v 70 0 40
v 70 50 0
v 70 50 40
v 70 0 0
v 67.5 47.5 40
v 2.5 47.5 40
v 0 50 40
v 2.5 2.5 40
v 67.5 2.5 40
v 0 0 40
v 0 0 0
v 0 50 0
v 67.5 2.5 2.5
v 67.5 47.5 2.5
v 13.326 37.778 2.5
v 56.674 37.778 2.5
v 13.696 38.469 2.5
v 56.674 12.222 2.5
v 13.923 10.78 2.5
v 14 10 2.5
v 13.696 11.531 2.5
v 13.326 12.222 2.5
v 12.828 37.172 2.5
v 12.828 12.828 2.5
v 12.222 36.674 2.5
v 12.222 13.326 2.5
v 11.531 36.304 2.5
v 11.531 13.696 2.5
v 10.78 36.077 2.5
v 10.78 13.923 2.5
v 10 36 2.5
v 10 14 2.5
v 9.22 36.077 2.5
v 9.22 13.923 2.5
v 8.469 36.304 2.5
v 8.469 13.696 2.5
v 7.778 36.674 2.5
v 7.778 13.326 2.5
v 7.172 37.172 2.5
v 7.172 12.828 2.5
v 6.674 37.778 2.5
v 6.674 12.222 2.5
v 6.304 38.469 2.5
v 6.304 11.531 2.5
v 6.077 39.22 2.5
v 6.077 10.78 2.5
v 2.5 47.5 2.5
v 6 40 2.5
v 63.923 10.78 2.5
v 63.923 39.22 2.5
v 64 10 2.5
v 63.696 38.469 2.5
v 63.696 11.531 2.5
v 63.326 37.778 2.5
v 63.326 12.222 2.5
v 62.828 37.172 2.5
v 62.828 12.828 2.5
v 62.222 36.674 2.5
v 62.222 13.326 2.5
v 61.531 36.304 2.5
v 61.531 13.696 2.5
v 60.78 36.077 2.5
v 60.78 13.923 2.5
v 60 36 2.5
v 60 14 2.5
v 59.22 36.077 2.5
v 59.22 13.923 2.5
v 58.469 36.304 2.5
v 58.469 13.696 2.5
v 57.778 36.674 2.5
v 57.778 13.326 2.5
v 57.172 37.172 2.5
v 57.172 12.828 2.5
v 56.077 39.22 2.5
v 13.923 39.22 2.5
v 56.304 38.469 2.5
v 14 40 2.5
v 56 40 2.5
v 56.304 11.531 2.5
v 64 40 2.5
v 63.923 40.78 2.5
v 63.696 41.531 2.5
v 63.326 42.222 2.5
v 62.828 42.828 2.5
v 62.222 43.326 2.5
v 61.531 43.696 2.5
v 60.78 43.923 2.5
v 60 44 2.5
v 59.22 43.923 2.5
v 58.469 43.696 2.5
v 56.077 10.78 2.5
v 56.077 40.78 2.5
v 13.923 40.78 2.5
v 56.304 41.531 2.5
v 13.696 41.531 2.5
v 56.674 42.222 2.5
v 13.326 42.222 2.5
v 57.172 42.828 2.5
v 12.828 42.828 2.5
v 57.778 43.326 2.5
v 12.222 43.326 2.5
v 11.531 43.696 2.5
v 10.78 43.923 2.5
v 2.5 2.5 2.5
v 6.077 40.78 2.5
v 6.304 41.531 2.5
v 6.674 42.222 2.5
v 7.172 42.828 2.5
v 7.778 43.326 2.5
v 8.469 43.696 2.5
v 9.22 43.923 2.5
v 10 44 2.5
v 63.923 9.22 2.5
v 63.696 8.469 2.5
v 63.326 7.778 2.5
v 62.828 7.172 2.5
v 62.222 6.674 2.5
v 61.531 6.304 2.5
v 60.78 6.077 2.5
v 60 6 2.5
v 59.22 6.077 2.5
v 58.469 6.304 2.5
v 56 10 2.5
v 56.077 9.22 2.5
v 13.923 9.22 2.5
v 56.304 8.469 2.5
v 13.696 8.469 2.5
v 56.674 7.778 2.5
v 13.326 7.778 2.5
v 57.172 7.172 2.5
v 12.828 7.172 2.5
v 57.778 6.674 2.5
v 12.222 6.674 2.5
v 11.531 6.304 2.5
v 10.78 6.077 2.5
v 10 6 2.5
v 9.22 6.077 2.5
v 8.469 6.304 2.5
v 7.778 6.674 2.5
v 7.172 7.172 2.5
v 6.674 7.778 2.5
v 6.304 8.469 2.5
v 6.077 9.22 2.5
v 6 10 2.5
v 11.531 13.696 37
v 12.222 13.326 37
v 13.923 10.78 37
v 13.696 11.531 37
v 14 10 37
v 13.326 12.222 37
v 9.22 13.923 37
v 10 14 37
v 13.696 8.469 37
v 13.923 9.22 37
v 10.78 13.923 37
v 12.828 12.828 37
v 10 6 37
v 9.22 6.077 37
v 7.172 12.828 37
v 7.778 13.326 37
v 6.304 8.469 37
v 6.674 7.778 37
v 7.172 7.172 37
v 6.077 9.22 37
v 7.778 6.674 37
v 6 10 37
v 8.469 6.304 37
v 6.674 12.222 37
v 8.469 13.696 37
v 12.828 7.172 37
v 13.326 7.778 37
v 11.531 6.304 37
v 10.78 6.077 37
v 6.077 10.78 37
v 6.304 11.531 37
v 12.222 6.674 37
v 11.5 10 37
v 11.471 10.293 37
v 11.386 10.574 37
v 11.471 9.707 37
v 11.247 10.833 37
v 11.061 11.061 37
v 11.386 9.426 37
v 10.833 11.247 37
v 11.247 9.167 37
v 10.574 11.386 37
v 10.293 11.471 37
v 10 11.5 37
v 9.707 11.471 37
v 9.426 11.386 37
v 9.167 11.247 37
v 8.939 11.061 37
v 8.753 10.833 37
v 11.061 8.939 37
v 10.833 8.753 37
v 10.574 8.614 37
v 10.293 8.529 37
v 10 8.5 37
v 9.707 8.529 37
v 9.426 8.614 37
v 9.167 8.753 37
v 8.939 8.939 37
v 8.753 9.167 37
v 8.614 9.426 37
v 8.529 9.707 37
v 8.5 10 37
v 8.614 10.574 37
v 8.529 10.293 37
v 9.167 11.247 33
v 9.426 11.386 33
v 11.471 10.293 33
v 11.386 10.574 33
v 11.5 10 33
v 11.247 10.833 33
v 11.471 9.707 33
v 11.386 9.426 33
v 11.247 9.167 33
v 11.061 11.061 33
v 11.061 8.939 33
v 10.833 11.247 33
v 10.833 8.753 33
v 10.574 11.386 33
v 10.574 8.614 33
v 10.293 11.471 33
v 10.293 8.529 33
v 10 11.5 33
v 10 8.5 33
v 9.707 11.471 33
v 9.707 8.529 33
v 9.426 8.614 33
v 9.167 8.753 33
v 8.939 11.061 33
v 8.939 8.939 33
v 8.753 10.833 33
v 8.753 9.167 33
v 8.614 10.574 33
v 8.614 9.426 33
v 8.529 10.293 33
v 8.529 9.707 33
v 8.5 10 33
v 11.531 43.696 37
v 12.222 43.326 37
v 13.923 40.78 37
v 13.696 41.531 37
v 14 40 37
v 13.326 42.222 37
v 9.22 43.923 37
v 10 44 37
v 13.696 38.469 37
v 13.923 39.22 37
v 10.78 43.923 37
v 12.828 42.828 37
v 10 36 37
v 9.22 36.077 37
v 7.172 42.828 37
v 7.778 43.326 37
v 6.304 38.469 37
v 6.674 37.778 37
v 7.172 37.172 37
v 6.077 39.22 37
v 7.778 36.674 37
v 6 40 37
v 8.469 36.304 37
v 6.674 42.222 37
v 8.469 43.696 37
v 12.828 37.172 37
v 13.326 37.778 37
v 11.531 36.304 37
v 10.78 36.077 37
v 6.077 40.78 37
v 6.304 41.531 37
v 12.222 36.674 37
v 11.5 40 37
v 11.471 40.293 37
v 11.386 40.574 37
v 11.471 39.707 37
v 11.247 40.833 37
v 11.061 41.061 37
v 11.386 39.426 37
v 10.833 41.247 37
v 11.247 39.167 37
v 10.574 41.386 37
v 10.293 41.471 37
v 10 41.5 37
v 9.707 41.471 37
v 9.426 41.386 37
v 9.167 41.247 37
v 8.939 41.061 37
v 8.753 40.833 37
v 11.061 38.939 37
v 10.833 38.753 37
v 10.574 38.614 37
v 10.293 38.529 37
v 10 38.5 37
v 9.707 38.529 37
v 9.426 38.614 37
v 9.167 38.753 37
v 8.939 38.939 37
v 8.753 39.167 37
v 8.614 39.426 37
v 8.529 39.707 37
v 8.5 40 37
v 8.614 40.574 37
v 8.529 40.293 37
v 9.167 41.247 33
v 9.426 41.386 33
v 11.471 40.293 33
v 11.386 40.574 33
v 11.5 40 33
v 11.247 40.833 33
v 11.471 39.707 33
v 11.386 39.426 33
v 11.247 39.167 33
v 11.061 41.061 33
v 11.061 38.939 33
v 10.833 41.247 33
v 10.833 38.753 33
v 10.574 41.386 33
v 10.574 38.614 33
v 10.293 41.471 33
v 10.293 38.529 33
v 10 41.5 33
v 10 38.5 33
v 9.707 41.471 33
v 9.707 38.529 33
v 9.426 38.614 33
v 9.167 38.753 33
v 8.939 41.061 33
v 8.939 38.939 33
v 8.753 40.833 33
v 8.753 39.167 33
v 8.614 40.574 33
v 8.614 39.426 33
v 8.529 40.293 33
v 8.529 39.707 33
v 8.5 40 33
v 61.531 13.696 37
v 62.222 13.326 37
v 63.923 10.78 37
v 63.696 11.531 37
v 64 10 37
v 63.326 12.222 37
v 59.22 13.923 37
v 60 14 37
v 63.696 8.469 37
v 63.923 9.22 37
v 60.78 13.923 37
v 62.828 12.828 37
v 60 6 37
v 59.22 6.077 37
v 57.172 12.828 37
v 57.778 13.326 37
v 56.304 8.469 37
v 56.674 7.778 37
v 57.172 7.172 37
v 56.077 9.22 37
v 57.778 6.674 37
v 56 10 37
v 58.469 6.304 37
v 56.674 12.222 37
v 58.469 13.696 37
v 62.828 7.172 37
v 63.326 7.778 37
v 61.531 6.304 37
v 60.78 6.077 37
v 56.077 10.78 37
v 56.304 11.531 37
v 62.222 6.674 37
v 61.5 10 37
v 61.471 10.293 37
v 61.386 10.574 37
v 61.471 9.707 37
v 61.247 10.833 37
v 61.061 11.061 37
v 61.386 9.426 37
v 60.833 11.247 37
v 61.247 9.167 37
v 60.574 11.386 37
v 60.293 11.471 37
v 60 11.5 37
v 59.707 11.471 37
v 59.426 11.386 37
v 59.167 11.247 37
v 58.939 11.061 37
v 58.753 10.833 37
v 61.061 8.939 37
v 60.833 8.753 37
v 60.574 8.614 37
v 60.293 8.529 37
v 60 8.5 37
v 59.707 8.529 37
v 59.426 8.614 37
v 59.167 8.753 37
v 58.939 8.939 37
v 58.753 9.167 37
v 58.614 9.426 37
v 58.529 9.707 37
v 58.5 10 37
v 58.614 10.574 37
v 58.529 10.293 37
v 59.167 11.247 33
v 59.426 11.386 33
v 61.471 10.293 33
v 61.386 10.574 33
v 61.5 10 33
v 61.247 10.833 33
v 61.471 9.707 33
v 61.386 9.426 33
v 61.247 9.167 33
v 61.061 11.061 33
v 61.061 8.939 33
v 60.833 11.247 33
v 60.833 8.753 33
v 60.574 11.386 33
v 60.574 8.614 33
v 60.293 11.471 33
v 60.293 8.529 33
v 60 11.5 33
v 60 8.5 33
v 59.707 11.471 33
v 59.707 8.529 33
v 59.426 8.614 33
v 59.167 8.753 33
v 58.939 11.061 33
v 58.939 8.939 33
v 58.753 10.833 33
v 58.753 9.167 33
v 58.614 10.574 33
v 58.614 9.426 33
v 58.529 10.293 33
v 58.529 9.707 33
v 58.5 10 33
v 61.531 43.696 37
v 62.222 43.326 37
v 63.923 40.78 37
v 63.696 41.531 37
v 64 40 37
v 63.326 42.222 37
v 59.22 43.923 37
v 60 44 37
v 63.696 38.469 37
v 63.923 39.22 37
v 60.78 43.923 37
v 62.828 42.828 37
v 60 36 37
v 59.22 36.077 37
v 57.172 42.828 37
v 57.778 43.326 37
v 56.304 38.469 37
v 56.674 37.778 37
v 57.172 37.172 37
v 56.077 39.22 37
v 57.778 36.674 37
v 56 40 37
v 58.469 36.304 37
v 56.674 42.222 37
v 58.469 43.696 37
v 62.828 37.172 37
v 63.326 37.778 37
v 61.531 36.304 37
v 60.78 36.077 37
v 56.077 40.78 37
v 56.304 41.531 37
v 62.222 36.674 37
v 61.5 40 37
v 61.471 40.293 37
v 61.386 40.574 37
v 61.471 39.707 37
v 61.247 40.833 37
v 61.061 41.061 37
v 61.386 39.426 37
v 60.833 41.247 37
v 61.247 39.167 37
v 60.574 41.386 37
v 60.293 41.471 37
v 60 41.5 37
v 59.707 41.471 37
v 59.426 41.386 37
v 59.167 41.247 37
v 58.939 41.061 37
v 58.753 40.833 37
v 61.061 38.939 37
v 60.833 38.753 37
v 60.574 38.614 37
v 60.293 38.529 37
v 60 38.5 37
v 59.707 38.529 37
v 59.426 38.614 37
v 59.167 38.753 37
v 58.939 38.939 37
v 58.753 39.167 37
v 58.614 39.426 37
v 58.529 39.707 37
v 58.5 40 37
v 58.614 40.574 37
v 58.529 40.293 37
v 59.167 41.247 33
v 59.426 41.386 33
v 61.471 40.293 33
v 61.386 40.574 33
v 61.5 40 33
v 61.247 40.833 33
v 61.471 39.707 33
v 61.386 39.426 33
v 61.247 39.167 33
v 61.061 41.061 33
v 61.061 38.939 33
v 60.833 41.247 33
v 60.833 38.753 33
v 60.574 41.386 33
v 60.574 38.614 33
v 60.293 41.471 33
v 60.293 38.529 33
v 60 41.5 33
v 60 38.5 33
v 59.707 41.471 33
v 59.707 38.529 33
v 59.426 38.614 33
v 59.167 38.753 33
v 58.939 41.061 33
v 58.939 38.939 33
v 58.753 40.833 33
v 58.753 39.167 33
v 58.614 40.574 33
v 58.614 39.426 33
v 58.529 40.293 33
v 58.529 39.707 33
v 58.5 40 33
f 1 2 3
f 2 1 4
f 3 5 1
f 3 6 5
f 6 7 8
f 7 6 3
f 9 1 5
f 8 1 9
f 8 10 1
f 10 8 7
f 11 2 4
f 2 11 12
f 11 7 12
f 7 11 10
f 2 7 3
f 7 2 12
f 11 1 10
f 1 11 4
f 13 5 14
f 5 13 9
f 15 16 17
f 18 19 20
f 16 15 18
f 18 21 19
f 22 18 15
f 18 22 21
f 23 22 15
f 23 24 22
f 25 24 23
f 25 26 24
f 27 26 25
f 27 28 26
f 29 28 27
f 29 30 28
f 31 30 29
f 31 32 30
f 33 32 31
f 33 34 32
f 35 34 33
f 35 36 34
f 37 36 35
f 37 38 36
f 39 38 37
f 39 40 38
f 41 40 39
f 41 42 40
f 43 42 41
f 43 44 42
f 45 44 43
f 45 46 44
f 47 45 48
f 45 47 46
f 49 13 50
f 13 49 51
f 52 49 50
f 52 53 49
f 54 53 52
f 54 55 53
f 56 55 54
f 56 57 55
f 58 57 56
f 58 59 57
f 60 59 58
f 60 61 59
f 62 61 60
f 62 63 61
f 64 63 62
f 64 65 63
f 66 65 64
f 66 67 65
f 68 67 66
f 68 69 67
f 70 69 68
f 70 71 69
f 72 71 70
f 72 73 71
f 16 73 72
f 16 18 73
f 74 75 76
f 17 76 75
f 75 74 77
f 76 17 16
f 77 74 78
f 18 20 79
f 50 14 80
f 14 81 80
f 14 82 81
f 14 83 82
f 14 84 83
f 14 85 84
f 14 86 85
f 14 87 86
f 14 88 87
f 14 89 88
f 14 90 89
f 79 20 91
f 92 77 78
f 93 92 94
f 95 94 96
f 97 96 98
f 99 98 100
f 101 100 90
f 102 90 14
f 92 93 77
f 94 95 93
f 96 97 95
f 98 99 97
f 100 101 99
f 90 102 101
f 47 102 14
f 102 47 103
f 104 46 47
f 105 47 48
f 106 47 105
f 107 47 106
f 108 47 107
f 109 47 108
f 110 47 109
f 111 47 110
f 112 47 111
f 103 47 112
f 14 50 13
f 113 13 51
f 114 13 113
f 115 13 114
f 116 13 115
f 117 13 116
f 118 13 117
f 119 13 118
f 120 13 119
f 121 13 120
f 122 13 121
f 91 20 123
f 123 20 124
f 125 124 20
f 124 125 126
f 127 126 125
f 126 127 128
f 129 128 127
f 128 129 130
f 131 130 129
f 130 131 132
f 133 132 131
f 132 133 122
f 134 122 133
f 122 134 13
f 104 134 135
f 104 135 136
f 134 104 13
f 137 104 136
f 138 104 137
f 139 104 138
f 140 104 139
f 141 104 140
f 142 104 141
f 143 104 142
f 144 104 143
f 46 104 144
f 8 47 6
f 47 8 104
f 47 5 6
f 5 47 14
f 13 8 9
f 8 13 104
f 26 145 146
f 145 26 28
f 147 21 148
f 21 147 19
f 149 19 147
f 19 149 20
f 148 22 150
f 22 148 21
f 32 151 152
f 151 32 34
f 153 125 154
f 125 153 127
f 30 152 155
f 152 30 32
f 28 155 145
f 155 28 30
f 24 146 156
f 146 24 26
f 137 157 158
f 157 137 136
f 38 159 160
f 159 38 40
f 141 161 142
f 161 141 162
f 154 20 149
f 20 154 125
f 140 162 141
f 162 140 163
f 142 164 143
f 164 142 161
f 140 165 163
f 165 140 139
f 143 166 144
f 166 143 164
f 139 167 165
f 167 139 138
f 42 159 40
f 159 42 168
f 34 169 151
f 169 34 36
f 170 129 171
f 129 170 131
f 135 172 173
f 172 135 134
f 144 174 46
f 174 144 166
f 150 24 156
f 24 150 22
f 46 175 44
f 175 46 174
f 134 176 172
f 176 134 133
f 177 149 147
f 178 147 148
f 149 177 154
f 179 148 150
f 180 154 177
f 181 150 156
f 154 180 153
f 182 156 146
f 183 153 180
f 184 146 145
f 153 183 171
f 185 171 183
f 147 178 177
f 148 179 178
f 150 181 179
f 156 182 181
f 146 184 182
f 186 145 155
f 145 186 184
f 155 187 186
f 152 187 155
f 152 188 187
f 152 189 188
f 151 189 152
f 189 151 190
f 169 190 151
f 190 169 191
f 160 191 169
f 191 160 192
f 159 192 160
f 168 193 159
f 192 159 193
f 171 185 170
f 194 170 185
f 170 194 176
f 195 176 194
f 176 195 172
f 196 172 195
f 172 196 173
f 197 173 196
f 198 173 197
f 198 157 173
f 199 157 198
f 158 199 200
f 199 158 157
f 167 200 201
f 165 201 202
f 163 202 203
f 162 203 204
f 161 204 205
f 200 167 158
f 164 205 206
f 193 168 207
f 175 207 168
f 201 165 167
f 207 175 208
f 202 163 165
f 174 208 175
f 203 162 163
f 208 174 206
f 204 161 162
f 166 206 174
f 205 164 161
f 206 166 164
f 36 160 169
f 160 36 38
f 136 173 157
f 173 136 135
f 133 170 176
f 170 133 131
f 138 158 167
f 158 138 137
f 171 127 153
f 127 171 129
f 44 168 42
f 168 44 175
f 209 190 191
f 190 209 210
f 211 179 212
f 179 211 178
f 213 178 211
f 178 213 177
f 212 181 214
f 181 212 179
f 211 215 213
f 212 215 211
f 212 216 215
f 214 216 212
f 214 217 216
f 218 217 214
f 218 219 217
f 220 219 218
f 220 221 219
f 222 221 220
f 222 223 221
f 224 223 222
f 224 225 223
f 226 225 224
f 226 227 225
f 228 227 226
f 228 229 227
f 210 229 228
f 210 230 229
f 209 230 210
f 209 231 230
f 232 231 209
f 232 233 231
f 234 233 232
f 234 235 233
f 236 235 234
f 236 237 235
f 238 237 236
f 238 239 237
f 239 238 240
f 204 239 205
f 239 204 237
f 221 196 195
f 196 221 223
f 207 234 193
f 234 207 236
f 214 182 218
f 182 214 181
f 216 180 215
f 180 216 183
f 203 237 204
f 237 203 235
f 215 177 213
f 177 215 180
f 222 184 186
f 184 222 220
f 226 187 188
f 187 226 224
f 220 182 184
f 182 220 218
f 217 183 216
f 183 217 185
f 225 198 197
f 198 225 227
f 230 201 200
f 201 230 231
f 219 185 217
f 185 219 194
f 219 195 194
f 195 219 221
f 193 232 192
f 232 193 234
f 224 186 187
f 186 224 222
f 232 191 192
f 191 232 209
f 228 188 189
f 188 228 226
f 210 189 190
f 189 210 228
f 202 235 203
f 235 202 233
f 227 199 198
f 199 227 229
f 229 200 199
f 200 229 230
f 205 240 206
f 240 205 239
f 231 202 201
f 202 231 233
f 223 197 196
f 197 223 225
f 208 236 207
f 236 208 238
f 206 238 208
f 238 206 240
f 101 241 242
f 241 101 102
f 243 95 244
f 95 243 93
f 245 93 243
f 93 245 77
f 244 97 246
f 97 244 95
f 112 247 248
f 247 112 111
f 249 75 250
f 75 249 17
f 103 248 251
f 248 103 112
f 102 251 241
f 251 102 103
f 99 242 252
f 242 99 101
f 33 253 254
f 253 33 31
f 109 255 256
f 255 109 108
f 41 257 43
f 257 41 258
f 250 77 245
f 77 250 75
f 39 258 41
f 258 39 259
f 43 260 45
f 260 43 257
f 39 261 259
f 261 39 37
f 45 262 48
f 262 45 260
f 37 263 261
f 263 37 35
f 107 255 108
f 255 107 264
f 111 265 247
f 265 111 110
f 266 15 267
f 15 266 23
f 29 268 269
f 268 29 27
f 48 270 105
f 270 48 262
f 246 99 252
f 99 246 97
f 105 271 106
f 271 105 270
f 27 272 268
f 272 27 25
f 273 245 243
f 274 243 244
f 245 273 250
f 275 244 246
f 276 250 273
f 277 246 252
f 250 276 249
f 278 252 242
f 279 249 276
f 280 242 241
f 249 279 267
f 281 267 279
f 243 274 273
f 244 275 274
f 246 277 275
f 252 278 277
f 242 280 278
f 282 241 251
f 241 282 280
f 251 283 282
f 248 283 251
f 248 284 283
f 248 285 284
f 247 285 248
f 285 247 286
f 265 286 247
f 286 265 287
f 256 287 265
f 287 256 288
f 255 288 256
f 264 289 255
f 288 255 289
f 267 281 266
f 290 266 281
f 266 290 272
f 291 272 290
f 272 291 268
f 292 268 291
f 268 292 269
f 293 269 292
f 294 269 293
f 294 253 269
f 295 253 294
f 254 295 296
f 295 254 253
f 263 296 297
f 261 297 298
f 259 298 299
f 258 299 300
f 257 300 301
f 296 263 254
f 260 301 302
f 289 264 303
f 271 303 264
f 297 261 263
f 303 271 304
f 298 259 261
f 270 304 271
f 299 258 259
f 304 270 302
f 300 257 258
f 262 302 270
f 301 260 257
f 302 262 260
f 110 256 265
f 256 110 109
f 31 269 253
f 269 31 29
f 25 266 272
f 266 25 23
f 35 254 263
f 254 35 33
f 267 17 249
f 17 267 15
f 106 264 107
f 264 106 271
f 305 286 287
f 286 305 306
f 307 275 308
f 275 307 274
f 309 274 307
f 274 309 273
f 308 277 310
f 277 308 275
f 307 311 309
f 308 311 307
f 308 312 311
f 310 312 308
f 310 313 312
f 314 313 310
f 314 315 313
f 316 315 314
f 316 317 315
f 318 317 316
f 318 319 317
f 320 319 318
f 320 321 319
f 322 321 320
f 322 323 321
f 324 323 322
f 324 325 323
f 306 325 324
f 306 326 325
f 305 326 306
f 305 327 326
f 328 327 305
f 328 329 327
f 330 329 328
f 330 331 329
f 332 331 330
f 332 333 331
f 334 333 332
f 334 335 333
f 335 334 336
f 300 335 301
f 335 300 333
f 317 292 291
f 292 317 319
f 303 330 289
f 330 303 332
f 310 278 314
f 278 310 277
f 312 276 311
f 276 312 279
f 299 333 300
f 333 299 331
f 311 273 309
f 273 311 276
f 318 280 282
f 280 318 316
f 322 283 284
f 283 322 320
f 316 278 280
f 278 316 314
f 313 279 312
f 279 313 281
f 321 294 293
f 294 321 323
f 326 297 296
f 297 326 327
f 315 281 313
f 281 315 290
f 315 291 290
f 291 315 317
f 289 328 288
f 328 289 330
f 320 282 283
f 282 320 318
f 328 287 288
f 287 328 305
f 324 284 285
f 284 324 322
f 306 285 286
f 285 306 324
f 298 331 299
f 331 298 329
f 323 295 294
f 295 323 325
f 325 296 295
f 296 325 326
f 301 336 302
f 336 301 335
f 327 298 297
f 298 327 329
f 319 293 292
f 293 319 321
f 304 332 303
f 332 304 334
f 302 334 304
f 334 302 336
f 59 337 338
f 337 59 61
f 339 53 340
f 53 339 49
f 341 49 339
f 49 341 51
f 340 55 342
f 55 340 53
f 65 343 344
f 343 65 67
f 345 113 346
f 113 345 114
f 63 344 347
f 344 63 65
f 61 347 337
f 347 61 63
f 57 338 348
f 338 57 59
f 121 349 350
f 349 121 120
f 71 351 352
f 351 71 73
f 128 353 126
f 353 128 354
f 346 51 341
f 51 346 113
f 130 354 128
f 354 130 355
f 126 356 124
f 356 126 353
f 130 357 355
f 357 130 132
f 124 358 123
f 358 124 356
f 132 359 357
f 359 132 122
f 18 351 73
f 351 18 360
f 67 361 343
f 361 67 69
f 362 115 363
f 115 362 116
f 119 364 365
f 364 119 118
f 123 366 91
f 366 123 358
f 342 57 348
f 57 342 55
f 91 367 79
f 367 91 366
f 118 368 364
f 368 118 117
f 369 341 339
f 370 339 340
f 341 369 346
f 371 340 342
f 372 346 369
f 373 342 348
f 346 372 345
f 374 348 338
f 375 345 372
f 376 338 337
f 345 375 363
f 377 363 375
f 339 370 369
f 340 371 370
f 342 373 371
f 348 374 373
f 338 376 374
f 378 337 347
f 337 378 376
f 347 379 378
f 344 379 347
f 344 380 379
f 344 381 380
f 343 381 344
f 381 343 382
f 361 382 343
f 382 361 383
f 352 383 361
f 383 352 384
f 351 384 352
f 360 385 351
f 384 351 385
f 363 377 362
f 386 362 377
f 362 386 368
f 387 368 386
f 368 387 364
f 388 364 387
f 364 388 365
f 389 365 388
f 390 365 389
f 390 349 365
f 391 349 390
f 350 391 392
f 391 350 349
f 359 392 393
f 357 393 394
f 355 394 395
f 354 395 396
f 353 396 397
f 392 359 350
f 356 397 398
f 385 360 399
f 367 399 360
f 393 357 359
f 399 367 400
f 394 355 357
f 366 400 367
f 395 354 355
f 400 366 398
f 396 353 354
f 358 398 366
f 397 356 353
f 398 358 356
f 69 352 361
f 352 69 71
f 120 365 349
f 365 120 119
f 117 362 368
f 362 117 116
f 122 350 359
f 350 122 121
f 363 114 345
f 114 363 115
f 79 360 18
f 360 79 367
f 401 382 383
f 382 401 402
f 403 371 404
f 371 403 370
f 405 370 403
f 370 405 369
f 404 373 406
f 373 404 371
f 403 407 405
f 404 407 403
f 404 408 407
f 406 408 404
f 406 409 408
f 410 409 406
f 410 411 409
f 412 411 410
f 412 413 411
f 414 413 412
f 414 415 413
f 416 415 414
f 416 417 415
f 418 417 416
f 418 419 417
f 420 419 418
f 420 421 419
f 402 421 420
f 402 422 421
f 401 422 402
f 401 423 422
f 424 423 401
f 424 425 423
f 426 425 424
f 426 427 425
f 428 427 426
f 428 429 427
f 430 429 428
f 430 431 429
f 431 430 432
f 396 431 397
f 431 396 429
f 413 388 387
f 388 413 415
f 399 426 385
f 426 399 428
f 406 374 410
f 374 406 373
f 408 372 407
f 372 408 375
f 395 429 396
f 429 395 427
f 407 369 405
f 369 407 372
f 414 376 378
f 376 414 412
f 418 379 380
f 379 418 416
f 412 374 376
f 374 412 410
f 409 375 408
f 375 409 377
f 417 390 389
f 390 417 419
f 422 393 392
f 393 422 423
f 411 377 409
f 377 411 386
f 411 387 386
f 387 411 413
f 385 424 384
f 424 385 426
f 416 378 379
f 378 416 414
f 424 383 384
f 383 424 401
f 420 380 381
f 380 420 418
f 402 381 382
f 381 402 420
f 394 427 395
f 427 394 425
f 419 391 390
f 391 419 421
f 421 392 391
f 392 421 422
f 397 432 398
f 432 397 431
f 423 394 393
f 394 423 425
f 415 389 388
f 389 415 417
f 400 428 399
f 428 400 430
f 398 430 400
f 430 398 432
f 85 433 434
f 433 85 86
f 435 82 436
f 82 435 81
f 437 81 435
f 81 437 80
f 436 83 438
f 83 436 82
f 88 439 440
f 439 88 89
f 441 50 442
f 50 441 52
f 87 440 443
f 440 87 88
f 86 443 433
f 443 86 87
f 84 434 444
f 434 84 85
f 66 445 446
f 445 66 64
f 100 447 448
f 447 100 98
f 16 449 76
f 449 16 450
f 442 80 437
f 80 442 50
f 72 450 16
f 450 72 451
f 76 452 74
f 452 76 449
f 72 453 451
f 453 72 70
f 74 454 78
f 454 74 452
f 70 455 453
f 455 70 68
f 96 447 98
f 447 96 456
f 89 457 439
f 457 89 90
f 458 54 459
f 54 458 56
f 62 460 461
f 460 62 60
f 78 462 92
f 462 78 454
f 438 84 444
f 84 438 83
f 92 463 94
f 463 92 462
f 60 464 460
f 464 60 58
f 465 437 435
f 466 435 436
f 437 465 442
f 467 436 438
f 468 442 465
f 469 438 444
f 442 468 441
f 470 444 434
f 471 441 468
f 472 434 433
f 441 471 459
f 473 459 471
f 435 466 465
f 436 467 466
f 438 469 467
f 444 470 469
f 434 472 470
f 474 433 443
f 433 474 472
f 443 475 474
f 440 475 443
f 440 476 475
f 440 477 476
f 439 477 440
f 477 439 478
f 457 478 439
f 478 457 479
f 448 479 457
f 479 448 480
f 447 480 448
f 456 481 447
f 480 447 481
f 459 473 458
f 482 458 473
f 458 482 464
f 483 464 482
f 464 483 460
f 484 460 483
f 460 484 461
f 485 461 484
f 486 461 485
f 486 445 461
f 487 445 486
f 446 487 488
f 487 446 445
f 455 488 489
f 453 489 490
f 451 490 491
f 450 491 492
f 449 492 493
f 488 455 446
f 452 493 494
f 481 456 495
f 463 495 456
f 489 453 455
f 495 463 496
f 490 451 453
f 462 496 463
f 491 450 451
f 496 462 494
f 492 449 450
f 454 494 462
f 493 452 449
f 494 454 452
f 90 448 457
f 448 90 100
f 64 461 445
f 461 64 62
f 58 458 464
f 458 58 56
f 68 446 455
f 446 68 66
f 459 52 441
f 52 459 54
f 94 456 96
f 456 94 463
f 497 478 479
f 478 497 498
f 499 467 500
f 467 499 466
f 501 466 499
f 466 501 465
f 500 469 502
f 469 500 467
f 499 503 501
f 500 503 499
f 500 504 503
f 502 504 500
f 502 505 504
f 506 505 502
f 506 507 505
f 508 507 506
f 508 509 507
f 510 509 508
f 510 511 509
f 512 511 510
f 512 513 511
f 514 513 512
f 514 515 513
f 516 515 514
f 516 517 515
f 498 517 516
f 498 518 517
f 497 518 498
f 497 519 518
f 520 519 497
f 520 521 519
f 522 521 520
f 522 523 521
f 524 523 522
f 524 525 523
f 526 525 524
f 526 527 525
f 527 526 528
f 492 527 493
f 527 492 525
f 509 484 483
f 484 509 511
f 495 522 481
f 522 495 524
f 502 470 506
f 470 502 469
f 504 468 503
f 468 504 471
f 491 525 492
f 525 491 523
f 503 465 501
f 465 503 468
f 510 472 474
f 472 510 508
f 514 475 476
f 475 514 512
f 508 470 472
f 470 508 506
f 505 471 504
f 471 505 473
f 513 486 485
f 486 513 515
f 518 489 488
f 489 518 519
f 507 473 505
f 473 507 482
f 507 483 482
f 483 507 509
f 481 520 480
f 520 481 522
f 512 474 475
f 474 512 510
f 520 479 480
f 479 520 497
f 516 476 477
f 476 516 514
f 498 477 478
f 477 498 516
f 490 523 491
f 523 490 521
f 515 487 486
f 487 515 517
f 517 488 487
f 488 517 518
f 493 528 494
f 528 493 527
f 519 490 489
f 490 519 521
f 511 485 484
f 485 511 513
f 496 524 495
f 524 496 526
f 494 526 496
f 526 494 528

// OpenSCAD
$fn = 32;

// ----------------------------------------------------------------------
// Enclosure box: bosses enclosure
// ----------------------------------------------------------------------

// --- parameters (mm) ---
box_l = 70;               // outer length, X
box_w = 50;               // outer width, Y
box_h = 40;               // outer height
wall_t = 2.5;             // wall thickness
boss_r = 4;               // corner boss radius
hole_r = 1.5;             // boss screw hole radius
boss_in = 10;             // boss inset from the corners

inner_h = box_h - wall_t;  // cavity depth
boss_h = inner_h - 2;  // corner boss height

difference() {
  union() {
    difference() {
      cube([box_l, box_w, box_h]);
      translate([wall_t, wall_t, wall_t])
        cube([box_l - 2 * wall_t, box_w - 2 * wall_t, box_h]);
    }
    for (sx = [0, 1], sy = [0, 1])
      translate([sx ? box_l - boss_in : boss_in,
                 sy ? box_w - boss_in : boss_in, wall_t - 1])
        difference() {
          cylinder(r = boss_r, h = boss_h);
          translate([0, 0, boss_h - 4])
            cylinder(r = hole_r, h = 5);
        }
  }
}
